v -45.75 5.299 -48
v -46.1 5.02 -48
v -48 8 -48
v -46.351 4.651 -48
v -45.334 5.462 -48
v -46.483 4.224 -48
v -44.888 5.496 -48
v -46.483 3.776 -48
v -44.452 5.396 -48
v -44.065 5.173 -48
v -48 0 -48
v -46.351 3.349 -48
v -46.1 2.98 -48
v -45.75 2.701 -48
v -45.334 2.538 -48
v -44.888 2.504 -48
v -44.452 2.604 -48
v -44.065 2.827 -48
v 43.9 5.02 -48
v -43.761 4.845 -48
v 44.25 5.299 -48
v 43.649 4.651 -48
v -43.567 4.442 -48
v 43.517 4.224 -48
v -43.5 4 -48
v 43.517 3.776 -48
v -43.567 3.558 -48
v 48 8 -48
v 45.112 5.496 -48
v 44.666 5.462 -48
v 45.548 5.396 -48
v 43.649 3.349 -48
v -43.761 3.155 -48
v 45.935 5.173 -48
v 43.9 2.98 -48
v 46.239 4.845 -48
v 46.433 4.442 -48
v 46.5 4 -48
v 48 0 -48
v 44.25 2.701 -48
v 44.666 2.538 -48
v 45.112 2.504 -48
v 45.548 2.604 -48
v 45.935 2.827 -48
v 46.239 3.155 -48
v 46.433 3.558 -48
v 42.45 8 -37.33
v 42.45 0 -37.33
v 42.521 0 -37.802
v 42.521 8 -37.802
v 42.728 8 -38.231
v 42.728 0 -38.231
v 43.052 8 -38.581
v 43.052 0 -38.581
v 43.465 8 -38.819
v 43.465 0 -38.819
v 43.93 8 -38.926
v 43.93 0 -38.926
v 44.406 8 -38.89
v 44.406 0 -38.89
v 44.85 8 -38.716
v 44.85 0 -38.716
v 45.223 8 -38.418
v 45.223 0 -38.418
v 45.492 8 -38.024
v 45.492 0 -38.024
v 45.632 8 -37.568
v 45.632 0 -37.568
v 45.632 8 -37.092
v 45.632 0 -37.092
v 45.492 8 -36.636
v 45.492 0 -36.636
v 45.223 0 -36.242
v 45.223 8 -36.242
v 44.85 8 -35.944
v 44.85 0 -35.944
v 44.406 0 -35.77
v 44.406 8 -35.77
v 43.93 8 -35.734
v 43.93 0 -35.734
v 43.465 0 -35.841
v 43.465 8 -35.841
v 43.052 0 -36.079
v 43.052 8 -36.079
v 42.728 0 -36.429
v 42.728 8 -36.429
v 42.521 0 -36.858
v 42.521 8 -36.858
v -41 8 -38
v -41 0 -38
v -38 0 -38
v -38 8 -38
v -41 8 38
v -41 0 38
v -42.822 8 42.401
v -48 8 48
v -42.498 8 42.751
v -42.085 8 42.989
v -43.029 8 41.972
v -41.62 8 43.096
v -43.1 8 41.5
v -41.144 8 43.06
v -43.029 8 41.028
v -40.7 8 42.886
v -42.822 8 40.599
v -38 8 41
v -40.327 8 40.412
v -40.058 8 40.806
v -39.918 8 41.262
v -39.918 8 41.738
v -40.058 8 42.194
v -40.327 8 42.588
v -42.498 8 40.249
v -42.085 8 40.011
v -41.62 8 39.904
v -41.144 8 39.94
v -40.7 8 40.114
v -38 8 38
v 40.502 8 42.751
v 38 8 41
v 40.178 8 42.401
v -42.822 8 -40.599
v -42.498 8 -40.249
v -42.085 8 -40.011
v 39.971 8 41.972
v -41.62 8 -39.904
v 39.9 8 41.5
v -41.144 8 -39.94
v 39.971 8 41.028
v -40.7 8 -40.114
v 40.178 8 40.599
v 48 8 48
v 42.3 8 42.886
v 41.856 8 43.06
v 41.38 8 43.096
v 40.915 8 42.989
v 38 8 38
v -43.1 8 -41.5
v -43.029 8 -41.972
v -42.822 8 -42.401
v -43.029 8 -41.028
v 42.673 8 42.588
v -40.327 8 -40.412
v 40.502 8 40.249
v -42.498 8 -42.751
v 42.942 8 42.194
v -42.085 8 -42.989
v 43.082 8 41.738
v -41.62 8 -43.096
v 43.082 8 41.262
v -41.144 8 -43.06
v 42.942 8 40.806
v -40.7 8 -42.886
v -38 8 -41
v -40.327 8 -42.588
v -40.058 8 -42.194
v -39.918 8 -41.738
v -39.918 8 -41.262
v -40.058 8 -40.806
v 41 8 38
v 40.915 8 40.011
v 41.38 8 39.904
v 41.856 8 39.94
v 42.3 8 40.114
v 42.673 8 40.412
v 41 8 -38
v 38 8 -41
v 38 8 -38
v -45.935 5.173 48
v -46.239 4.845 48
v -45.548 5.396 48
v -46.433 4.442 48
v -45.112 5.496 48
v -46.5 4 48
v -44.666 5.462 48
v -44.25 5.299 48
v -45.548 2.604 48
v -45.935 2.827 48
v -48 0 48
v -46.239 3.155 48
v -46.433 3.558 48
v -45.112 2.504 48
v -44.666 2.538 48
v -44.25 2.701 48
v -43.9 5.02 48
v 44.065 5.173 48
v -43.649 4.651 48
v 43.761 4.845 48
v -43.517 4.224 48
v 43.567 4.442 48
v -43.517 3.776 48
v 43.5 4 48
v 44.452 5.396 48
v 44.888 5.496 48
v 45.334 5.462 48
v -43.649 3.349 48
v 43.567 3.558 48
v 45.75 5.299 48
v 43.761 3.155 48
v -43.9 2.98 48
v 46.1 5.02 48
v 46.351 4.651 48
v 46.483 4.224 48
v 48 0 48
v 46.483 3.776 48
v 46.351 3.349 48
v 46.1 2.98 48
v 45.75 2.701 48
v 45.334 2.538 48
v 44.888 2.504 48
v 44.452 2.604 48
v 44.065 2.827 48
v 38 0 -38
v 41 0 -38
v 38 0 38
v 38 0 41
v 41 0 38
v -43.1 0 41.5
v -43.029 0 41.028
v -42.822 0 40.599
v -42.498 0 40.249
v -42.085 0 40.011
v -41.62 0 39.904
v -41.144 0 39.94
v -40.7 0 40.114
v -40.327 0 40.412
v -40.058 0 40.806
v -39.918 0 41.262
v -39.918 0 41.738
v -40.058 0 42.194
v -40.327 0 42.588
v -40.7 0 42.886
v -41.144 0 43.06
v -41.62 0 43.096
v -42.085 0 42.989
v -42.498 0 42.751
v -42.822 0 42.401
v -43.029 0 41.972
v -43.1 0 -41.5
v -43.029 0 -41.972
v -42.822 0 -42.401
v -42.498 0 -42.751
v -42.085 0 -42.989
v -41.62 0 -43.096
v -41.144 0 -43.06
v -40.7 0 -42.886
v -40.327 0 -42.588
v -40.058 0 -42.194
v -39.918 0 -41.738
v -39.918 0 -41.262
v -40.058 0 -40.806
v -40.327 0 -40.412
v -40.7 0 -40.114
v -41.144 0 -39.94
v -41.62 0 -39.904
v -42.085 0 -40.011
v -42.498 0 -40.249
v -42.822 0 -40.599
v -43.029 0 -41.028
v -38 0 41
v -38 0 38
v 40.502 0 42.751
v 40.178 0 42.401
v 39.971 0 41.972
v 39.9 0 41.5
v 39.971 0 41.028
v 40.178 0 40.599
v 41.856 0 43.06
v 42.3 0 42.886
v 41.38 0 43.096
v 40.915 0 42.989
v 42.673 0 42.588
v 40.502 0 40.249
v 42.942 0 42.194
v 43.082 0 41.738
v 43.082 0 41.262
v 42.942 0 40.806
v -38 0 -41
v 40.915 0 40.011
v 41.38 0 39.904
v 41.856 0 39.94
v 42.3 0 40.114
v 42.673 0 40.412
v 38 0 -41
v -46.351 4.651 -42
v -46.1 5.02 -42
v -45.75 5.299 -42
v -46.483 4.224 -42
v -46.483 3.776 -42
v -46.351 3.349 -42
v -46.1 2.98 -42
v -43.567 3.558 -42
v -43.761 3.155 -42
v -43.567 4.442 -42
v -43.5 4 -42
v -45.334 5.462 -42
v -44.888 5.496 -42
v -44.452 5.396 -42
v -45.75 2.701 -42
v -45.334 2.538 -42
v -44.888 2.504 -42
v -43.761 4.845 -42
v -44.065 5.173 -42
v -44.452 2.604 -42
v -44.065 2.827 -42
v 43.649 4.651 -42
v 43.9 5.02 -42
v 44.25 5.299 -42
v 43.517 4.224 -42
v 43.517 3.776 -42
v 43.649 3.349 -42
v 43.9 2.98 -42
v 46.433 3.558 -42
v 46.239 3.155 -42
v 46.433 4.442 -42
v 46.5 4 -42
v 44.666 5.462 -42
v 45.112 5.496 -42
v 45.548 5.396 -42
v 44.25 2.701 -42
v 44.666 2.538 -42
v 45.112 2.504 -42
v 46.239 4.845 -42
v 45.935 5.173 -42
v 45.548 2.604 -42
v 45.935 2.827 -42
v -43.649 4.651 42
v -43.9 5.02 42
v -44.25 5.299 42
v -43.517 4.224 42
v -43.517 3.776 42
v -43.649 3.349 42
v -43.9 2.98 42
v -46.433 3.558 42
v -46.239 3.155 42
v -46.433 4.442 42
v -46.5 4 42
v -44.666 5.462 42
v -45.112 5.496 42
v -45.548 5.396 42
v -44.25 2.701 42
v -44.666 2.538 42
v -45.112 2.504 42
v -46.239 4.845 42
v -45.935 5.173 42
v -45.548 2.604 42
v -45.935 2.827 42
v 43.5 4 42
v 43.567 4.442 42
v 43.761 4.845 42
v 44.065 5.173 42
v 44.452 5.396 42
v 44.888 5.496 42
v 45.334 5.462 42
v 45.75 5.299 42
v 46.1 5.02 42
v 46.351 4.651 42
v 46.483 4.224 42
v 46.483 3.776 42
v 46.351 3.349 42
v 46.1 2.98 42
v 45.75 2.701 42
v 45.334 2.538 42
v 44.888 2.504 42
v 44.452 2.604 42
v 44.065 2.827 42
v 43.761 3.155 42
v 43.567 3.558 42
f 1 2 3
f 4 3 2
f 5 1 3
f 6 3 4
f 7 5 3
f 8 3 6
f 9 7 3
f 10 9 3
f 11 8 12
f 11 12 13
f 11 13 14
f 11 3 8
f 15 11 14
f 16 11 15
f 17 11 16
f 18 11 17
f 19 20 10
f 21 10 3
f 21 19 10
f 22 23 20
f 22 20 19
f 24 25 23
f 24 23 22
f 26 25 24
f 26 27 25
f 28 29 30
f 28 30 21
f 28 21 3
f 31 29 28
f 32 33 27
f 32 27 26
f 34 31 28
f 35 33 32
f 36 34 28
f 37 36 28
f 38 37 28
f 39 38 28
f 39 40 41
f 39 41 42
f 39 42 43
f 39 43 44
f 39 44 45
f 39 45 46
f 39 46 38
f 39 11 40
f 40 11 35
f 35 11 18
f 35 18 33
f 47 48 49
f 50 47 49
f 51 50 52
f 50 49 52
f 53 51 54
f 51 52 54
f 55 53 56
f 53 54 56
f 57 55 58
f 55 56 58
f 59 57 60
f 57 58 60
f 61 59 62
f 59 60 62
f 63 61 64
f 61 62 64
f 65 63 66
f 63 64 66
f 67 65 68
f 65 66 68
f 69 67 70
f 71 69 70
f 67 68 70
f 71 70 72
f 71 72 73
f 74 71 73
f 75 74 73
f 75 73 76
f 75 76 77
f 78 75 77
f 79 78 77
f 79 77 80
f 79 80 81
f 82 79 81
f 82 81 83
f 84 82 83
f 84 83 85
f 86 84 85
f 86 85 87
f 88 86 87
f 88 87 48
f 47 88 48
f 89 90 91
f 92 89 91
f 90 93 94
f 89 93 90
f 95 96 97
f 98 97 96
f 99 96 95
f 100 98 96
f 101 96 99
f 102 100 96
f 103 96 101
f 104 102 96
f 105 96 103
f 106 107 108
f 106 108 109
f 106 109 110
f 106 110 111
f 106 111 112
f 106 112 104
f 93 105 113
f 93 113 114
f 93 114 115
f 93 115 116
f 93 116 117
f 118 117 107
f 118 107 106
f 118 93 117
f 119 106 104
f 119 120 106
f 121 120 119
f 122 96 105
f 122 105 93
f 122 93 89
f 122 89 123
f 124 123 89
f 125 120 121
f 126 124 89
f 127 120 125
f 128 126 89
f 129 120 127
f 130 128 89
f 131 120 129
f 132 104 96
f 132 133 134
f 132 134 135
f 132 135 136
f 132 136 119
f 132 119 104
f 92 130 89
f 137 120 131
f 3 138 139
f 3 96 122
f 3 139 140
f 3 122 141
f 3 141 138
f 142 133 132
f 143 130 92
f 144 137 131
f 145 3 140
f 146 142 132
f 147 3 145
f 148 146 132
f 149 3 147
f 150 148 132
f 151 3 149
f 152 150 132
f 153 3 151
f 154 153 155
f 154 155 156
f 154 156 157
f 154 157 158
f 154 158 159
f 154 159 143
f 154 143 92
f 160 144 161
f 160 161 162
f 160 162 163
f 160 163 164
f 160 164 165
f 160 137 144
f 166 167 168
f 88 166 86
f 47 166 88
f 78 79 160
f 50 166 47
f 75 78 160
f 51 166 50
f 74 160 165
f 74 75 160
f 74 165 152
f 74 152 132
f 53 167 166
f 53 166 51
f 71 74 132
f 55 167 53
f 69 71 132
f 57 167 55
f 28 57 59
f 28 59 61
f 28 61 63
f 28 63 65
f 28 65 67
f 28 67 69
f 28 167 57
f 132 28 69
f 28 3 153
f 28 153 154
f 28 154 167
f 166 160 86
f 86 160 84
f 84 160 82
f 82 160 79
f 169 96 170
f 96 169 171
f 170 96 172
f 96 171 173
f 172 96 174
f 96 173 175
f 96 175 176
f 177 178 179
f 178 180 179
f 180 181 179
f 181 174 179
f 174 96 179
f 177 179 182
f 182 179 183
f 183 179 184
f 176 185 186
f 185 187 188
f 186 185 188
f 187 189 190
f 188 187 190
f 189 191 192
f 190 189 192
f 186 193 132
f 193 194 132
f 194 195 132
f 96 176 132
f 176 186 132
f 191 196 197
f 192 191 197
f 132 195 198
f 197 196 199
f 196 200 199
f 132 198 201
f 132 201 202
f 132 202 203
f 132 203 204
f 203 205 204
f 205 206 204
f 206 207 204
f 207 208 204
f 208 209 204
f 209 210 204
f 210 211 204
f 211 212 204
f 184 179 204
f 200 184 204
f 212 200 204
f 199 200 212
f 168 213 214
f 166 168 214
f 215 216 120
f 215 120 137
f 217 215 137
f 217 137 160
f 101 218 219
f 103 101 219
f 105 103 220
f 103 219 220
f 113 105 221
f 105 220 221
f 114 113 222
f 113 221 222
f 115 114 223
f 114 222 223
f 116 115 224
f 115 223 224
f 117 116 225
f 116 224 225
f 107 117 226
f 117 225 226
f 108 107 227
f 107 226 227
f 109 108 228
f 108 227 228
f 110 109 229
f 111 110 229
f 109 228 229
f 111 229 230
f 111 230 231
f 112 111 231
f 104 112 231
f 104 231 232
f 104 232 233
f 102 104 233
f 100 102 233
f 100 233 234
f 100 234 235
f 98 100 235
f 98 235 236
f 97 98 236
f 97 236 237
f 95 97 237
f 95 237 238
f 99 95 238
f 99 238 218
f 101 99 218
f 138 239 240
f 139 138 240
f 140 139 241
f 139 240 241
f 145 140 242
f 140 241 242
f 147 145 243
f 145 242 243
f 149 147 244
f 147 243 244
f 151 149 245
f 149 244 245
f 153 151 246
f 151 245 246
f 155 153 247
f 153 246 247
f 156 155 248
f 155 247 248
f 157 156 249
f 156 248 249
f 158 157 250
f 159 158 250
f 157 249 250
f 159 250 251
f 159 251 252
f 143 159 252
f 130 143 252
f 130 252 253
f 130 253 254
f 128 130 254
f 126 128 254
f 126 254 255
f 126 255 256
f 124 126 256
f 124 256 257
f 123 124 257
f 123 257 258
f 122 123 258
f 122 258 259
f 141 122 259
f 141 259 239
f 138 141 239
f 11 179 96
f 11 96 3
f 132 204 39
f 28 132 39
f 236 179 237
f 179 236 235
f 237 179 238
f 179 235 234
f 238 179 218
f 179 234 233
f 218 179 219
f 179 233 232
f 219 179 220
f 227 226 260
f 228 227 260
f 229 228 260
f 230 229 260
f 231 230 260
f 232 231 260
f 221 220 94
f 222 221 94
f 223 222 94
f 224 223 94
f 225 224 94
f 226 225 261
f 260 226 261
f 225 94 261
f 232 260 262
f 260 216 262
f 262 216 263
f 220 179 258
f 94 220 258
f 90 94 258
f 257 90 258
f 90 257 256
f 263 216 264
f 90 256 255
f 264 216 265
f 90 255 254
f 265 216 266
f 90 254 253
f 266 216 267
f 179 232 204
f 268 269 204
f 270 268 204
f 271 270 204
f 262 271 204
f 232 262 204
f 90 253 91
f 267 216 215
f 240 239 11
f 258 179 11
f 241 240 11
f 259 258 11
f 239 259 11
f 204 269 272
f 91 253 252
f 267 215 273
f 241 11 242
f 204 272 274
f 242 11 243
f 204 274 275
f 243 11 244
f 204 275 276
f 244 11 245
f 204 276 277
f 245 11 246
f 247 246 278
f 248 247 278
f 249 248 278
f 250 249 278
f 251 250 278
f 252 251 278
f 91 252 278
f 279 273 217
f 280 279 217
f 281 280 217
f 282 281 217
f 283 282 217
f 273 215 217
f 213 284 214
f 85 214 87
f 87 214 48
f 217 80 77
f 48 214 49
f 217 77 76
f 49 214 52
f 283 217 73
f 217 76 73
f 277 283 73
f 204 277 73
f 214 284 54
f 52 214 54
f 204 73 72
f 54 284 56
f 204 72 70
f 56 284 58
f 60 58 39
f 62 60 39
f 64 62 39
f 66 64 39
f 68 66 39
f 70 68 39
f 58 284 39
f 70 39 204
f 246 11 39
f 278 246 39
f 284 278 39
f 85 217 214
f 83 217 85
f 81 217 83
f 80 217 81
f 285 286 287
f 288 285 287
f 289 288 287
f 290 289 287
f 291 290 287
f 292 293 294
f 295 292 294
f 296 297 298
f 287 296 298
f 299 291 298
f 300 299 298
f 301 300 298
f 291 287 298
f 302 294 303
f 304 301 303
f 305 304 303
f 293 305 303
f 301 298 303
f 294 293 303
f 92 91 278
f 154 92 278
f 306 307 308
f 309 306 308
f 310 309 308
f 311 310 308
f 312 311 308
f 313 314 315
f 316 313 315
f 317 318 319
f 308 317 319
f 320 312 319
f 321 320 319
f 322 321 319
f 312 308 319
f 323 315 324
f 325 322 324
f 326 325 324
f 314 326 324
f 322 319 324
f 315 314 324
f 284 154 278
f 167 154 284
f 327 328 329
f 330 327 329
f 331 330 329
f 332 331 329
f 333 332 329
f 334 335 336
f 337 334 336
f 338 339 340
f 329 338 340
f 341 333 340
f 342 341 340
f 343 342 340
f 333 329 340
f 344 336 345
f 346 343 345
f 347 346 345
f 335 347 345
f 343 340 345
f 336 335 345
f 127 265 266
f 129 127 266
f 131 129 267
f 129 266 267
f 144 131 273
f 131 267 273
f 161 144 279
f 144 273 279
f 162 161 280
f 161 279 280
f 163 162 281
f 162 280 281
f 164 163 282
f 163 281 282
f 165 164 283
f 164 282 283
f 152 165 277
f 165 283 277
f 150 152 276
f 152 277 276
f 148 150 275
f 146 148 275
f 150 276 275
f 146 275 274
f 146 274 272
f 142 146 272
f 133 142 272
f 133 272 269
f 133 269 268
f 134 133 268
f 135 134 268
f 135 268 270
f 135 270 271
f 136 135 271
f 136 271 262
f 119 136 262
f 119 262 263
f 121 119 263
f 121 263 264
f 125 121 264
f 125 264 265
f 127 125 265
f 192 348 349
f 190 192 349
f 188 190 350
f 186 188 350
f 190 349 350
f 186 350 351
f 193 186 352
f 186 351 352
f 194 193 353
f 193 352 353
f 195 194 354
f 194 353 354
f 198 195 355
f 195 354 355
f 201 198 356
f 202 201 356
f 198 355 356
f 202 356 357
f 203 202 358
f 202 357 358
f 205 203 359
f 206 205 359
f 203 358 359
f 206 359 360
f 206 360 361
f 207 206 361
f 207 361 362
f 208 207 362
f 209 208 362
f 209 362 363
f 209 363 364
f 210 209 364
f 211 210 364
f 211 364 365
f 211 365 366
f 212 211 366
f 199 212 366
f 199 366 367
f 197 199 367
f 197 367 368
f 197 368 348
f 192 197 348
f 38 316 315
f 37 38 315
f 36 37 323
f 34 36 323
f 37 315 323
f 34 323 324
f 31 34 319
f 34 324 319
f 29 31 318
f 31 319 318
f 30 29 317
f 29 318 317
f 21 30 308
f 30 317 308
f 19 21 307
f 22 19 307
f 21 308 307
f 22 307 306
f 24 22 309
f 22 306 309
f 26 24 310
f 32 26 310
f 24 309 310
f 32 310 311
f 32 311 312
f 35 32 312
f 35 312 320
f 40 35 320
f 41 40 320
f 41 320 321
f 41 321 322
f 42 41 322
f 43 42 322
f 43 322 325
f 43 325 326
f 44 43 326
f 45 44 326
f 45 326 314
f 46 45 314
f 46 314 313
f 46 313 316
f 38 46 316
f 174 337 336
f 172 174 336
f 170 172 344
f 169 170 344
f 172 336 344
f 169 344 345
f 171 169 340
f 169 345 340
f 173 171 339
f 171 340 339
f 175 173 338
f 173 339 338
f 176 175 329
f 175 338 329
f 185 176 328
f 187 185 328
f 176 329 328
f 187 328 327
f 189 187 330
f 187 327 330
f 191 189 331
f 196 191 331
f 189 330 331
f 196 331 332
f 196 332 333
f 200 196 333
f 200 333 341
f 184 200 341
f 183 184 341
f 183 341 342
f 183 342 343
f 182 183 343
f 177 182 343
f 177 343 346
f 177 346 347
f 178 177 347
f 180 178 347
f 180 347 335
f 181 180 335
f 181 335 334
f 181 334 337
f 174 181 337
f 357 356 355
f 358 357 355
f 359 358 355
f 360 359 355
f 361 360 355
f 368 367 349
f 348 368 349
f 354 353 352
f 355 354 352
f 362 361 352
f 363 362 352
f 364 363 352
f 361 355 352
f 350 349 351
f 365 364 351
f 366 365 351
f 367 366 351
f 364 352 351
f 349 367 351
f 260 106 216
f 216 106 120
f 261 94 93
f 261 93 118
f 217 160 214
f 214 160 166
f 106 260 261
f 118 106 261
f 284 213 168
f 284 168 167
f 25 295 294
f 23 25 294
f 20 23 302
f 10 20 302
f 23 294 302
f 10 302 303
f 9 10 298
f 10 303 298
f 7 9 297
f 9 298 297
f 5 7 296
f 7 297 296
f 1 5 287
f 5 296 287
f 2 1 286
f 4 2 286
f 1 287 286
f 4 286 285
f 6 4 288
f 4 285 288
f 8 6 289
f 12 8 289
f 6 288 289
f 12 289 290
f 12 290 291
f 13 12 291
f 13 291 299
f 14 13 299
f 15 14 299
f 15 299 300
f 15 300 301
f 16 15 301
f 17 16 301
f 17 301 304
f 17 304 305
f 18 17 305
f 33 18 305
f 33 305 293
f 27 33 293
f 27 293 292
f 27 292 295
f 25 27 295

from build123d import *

# Parameters (mm, degrees)
SKETCH1_W                    = 96
SKETCH1_H                    = 96
SKETCH1_W_2                  = 80
SKETCH1_H_2                  = 80
BOSS_EXTRUDE1_DEPTH          = 8
F_3_0_3_DIAMETER_HOLE6_D     = 3
F_3_0_3_DIAMETER_HOLE6_DEPTH = 6
F_3_0_3_DIAMETER_HOLE3_D     = 3
F_3_0_3_DIAMETER_HOLE3_DEPTH = 6
SKETCH27_W                   = 82
SKETCH27_H                   = 82
CUT_EXTRUDE2_DEPTH           = 10
SKETCH35_W                   = 3
SKETCH35_H                   = 3
BOSS_EXTRUDE2_DEPTH          = 8
F_3_2_3_2_DIAMETER_HOLE1_D   = 3.2


with BuildPart() as part:
    # Sketch1 → Boss-Extrude1 (new body)
    with BuildSketch(Plane(origin=(0, 0, 0), x_dir=(1, 0, 0), z_dir=(0, 1, 0))):
        Rectangle(SKETCH1_W, SKETCH1_H)
        Rectangle(SKETCH1_W_2, SKETCH1_H_2, mode=Mode.SUBTRACT)
    extrude(amount=BOSS_EXTRUDE1_DEPTH)

    # Ø3.0 (3) Diameter Hole6
    with Locations(Plane.XY.offset(48)):
        with Locations((45, 4), (-45, 4)):
            Hole(F_3_0_3_DIAMETER_HOLE6_D / 2, depth=F_3_0_3_DIAMETER_HOLE6_DEPTH)

    # Ø3.0 (3) Diameter Hole3
    with Locations(Plane(origin=(0, 0, -48), x_dir=(-1, 0, 0), z_dir=(0, 0, -1))):
        with Locations((45, 4), (-45, 4)):
            Hole(F_3_0_3_DIAMETER_HOLE3_D / 2, depth=F_3_0_3_DIAMETER_HOLE3_DEPTH)

    # Sketch27 → Cut-Extrude2 (cut)
    with BuildSketch(Plane(origin=(0, 8, 0), x_dir=(1, 0, 0), z_dir=(0, 1, 0))):
        Rectangle(SKETCH27_W, SKETCH27_H)
    extrude(amount=-CUT_EXTRUDE2_DEPTH, mode=Mode.SUBTRACT)

    # Sketch35 → Boss-Extrude2 (add)
    with BuildSketch(Plane(origin=(0, 8, 0), x_dir=(1, 0, 0), z_dir=(0, 1, 0))):
        with Locations((-39.5, 39.5)):
            Rectangle(SKETCH35_W, SKETCH35_H)
        with Locations((39.5, 39.5)):
            Rectangle(SKETCH35_W, SKETCH35_H)
        with Locations((39.5, -39.5)):
            Rectangle(SKETCH35_W, SKETCH35_H)
        with Locations((-39.5, -39.5)):
            Rectangle(SKETCH35_W, SKETCH35_H)
    extrude(amount=-BOSS_EXTRUDE2_DEPTH)

    # Ø3.2 (3.2) Diameter Hole1 (through all)
    with Locations(Plane(origin=(0, 8, 0), x_dir=(1, 0, 0), z_dir=(0, 1, 0))):
        with Locations((44.05, 37.33), (41.5, -41.5), (-41.5, -41.5), (-41.5, 41.5)):
            Hole(F_3_2_3_2_DIAMETER_HOLE1_D / 2)


solid = part.part
